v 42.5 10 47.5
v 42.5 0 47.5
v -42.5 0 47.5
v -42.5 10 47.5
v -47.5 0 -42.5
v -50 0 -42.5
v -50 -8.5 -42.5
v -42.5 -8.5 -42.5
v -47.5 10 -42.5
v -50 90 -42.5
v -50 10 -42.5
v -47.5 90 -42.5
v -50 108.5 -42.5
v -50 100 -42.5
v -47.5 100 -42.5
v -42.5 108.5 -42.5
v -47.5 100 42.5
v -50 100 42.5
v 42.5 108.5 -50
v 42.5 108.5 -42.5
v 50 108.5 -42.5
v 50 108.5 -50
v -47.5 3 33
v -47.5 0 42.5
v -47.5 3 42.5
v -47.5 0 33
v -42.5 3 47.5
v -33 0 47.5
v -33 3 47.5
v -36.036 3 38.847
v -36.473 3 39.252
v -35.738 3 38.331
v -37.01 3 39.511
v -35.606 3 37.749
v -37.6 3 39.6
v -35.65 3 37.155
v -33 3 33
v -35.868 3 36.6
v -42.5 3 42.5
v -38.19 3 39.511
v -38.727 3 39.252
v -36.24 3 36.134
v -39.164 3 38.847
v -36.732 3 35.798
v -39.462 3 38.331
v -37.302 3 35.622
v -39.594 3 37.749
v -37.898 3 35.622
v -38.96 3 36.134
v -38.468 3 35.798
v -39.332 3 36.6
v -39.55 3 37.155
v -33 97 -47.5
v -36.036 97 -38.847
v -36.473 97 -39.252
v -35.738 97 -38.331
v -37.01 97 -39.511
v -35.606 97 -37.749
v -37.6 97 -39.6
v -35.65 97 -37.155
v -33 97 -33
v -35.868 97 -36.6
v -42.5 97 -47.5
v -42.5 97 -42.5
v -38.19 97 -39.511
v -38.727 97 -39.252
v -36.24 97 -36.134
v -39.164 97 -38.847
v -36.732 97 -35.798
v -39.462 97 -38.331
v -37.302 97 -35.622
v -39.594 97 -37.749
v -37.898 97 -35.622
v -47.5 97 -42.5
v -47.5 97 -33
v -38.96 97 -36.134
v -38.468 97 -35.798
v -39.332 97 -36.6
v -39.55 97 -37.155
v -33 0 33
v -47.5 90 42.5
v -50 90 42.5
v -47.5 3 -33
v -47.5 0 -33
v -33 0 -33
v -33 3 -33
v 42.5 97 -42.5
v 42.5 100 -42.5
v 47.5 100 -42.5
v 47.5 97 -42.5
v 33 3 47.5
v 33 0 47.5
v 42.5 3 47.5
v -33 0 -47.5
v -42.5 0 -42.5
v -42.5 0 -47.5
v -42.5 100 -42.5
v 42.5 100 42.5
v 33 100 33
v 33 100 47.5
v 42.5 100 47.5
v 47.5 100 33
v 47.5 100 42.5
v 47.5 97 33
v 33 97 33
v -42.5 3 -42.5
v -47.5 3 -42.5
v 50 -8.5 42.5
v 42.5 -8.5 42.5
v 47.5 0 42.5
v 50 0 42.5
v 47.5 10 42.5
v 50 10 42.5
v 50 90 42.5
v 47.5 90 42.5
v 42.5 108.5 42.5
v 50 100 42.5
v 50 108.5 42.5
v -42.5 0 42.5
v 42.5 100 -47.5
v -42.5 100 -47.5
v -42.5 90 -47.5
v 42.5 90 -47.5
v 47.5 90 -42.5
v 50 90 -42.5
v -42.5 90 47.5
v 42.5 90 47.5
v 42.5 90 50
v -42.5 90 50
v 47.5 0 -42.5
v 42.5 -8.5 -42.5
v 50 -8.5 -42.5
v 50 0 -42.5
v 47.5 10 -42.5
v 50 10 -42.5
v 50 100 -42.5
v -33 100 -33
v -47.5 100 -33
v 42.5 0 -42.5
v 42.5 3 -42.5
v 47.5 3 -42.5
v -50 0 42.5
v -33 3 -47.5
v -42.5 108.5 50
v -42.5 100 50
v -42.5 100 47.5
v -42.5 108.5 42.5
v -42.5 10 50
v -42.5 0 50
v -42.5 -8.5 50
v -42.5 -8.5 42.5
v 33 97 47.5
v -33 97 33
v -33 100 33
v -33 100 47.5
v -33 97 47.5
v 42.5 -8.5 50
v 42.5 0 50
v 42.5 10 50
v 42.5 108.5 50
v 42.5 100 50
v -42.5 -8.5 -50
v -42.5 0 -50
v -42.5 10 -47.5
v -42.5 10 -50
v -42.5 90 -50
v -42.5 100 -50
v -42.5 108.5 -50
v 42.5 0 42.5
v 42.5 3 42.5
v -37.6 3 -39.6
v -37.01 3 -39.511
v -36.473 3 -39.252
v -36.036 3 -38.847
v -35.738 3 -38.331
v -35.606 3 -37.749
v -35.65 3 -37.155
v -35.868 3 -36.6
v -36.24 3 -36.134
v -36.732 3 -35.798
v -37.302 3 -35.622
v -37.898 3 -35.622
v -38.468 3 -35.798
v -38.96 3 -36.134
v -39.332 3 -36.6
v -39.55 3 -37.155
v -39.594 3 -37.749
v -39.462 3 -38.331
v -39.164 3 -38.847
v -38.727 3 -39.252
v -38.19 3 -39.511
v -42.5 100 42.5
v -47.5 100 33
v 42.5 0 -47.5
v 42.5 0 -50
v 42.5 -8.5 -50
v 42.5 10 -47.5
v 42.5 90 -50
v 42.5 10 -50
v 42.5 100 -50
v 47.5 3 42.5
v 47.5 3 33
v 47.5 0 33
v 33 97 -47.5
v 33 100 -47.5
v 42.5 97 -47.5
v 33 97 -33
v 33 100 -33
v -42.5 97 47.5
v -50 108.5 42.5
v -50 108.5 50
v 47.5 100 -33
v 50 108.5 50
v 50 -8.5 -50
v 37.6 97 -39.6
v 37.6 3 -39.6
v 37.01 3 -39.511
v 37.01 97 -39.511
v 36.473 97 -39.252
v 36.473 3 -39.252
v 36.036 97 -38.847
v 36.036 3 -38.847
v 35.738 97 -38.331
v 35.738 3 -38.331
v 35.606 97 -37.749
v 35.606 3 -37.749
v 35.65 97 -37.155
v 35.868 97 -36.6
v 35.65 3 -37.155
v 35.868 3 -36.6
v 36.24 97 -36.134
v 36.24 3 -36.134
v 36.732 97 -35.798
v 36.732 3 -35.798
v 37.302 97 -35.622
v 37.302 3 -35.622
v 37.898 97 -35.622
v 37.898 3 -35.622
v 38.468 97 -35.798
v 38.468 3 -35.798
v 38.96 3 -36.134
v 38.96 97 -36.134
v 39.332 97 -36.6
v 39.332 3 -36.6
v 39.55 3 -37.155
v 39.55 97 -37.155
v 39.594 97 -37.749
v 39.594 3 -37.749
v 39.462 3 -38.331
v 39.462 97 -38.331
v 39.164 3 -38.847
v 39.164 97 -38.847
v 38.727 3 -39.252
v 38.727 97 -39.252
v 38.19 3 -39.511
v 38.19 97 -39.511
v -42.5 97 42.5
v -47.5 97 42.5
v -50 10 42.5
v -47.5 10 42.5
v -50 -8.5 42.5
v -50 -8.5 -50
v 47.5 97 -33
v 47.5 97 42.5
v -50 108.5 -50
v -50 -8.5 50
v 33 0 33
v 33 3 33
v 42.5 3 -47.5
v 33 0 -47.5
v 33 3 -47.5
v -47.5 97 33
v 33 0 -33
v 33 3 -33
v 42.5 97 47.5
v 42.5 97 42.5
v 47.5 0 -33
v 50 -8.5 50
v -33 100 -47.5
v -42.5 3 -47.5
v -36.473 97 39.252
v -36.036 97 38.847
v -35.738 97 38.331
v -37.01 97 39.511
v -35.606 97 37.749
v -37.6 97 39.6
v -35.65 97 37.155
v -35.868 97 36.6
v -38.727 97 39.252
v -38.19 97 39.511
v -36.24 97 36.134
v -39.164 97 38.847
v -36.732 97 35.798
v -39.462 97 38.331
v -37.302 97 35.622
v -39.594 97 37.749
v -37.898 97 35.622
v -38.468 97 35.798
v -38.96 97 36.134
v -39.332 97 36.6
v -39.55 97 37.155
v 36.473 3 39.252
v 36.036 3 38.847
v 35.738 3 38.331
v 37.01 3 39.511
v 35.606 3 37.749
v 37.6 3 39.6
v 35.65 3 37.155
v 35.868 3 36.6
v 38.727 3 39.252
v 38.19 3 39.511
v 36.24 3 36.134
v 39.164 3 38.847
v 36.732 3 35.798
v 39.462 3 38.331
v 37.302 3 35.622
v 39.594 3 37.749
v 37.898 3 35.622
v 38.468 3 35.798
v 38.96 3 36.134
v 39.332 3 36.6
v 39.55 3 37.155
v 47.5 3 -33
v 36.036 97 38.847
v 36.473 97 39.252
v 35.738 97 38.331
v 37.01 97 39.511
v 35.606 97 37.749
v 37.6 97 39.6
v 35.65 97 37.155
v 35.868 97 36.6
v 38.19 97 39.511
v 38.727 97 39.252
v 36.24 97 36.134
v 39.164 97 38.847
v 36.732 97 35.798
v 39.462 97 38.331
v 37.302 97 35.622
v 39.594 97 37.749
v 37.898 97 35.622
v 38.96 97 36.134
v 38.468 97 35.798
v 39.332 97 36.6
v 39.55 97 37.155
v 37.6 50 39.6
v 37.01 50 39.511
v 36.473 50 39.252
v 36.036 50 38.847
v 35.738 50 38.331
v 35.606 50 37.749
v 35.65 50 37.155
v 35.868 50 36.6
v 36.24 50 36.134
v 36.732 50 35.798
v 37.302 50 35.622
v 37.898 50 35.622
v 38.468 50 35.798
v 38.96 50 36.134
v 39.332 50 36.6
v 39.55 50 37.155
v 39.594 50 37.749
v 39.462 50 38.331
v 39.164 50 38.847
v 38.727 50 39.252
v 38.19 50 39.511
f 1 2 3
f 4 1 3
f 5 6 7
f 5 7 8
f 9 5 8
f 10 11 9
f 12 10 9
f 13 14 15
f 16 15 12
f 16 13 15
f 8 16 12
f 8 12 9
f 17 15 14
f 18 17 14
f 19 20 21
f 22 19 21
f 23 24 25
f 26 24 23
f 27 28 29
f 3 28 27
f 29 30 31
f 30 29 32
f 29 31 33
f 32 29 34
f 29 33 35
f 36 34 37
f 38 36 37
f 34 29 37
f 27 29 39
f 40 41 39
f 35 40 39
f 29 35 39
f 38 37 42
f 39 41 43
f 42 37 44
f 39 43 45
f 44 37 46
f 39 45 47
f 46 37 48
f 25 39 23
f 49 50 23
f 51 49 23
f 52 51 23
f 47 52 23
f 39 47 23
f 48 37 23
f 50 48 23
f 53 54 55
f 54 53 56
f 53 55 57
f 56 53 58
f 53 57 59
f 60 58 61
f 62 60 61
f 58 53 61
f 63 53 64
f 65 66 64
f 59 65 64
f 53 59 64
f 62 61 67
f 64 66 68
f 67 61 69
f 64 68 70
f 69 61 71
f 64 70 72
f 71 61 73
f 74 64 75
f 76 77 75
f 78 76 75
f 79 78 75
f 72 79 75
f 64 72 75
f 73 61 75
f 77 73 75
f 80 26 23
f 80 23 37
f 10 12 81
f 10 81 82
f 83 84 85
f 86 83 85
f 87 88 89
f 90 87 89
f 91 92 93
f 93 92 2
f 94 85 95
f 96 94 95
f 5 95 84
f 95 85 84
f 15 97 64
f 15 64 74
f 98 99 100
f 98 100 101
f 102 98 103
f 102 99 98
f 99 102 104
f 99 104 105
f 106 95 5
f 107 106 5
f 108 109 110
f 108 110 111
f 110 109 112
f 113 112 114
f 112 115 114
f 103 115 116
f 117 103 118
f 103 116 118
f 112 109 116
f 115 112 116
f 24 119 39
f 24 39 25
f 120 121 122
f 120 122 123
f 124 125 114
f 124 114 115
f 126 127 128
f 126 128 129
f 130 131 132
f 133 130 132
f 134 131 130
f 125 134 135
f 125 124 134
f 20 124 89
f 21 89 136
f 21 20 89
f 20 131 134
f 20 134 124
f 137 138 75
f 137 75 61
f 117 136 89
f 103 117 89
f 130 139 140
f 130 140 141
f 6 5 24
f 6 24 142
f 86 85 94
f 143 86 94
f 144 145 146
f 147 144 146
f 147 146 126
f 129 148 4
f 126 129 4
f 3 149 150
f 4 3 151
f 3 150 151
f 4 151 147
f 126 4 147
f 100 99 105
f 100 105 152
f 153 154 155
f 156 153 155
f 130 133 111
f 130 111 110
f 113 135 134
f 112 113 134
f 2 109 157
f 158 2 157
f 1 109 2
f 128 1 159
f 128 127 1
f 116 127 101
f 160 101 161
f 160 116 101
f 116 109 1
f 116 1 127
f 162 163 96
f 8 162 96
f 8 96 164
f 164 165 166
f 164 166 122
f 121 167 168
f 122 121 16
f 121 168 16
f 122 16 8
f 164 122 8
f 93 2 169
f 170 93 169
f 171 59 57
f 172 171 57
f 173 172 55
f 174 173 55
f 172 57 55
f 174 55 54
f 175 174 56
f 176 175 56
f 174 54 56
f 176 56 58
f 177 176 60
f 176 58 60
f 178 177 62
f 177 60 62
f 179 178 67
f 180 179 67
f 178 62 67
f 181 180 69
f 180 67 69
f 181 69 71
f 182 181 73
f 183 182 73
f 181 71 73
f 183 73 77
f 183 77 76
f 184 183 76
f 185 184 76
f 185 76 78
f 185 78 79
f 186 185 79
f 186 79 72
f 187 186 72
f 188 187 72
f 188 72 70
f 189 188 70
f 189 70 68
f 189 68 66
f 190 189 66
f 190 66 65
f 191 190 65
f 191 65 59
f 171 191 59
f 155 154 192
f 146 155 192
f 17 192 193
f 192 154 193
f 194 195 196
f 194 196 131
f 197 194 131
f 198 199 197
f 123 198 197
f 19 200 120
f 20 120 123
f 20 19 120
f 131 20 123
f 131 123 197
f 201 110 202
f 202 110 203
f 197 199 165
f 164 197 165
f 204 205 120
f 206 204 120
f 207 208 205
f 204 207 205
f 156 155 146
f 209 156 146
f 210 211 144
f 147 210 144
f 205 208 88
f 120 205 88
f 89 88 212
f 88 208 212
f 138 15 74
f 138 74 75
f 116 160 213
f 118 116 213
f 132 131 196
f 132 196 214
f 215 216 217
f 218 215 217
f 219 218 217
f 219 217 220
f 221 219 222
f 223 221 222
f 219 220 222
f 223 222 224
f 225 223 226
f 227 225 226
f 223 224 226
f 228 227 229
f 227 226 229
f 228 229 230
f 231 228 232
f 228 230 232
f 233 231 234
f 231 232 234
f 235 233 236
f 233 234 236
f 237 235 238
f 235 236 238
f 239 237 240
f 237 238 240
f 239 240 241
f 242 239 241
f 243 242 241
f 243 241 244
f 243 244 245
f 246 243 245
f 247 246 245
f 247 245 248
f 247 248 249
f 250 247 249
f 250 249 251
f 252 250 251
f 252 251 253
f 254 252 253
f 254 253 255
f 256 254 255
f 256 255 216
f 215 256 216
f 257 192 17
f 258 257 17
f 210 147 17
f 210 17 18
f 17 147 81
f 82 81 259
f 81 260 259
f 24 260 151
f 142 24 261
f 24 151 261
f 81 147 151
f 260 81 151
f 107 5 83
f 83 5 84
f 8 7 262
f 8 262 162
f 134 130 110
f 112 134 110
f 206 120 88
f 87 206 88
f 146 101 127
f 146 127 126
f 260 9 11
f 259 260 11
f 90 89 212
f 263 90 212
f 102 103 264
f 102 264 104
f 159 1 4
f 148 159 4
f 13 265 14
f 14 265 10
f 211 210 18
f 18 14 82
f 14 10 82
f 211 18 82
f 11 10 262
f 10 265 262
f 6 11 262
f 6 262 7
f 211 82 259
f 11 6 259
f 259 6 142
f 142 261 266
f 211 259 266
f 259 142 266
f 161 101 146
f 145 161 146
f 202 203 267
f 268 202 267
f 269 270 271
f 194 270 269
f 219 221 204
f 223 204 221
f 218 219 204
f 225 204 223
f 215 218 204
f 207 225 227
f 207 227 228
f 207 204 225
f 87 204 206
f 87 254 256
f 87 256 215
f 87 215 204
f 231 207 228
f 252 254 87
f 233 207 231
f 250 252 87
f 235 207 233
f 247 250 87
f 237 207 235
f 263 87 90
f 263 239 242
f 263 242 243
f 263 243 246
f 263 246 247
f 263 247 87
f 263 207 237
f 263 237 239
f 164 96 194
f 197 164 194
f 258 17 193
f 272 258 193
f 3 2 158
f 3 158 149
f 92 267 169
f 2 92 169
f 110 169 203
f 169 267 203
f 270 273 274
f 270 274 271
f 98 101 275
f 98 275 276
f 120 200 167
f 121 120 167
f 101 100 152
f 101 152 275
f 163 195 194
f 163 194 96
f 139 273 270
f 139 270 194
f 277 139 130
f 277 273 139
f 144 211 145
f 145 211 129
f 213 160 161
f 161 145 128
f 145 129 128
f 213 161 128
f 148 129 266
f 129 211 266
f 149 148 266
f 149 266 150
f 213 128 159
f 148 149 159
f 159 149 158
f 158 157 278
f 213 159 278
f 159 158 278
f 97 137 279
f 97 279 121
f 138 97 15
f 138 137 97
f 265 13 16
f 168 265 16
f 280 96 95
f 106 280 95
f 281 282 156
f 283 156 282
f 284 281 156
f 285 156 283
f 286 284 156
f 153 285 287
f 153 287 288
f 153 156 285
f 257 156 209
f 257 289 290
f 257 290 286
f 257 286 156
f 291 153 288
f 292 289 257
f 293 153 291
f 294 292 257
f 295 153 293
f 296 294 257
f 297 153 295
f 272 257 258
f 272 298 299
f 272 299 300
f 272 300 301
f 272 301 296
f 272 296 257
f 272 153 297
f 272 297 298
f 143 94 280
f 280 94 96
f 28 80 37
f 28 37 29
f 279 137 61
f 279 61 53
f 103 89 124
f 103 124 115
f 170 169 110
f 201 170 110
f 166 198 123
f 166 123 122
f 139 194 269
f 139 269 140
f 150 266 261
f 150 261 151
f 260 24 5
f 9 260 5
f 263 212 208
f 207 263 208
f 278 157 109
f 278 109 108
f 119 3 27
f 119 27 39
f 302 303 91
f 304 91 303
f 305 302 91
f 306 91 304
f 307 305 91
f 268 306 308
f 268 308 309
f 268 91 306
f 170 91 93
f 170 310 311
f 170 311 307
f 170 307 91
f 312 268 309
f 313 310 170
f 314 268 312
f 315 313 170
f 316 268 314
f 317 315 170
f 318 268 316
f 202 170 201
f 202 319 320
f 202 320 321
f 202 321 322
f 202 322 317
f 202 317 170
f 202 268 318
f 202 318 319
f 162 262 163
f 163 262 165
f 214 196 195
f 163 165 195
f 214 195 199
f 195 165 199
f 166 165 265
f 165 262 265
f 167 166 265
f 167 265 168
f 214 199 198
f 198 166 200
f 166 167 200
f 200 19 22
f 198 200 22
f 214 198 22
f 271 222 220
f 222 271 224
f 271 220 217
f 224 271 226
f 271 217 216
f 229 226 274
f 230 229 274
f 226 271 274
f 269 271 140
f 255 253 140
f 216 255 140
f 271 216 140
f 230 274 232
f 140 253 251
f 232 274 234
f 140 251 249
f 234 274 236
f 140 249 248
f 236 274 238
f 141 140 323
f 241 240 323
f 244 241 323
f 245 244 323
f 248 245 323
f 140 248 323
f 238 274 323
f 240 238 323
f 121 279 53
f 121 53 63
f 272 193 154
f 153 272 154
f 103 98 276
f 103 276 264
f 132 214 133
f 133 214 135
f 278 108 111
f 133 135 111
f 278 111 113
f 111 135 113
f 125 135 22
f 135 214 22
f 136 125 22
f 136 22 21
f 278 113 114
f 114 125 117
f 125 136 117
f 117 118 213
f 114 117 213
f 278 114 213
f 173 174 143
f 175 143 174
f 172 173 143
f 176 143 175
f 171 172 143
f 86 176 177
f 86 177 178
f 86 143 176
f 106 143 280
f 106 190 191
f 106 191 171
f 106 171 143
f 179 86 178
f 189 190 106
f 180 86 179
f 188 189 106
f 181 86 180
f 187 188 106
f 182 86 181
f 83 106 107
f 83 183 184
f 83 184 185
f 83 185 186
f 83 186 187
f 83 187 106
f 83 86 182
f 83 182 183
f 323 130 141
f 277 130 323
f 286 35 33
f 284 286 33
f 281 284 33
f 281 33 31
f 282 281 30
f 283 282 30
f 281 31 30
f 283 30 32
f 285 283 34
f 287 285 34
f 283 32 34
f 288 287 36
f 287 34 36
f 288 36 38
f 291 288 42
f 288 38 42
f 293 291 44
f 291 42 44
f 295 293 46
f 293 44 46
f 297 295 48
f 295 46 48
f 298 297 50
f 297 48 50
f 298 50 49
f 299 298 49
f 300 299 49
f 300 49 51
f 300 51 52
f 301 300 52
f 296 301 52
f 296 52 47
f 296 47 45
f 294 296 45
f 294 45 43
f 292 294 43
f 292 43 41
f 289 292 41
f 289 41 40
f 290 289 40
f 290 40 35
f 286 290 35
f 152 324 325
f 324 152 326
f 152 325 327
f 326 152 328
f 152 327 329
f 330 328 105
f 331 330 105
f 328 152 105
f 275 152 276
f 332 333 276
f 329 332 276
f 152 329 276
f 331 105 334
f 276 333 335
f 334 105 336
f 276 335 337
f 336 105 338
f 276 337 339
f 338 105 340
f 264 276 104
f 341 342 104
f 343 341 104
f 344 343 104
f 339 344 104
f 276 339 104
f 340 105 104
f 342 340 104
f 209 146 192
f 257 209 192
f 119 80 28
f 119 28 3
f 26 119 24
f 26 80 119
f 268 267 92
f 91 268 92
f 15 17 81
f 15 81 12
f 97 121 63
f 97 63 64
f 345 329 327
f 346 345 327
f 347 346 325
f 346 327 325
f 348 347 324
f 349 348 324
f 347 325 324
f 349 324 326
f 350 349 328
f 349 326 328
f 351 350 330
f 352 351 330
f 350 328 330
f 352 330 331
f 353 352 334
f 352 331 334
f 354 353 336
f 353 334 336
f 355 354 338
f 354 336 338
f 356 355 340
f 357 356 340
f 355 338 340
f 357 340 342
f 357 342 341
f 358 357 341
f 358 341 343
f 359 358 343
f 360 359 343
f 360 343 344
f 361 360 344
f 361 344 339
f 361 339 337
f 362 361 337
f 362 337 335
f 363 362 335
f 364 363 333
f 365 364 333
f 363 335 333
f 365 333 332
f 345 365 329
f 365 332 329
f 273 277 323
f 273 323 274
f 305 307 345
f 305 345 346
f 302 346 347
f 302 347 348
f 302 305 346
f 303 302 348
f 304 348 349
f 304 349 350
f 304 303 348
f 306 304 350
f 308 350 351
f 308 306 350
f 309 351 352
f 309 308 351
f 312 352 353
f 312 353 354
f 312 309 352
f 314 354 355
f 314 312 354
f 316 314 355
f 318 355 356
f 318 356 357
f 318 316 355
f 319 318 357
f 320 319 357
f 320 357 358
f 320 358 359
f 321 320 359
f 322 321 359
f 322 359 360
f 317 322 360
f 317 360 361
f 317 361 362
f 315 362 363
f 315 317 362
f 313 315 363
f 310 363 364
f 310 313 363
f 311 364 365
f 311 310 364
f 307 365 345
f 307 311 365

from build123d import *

# Parameters (mm, degrees)
BOSS_EXTRUDE1_DEPTH  = 10
SKETCH3_W            = 7.5
SKETCH3_H            = 7.5
BOSS_EXTRUDE2_DEPTH  = 40
SKETCH5_W            = 7.5
SKETCH5_H            = 7.5
BOSS_EXTRUDE8_DEPTH  = 8.5
BOSS_EXTRUDE9_DEPTH  = 3
SKETCH7_R            = 2
BOSS_EXTRUDE10_DEPTH = 47


with BuildPart() as part:
    # Sketch2 → Boss-Extrude1 (new body)
    with BuildSketch(Plane(origin=(0, 0, 0), x_dir=(1, 0, 0), z_dir=(0, 1, 0))):
        Polygon((-50, 50), (-42.5, 50), (0, 50), (42.5, 50), (50, 50), (50, 42.5), (50, 0), (50, -42.5), (50, -50), (42.5, -50), (0, -50), (-42.5, -50), (-50, -50), (-50, -42.5), (-50, 0), (-50, 42.5), align=None)
        Polygon((-42.5, 42.5), (-42.5, 47.5), (0, 47.5), (42.5, 47.5), (42.5, 42.5), (47.5, 42.5), (47.5, 0), (47.5, -42.5), (42.5, -42.5), (42.5, -47.5), (0, -47.5), (-42.5, -47.5), (-42.5, -42.5), (-47.5, -42.5), (-47.5, 0), (-47.5, 42.5), align=None, mode=Mode.SUBTRACT)
    extrude(amount=BOSS_EXTRUDE1_DEPTH)

    # Sketch3 → Boss-Extrude2 (add)
    with BuildSketch(Plane(origin=(0, 10, 0), x_dir=(1, 0, 0), z_dir=(0, 1, 0))):
        with Locations((46.25, 46.25)):
            Rectangle(SKETCH3_W, SKETCH3_H)
        with Locations((46.25, -46.25)):
            Rectangle(SKETCH3_W, SKETCH3_H)
        with Locations((-46.25, 46.25)):
            Rectangle(SKETCH3_W, SKETCH3_H)
        with Locations((-46.25, -46.25)):
            Rectangle(SKETCH3_W, SKETCH3_H)
    extrude(amount=BOSS_EXTRUDE2_DEPTH)

    # Sketch5 → Boss-Extrude8 (add)
    with BuildSketch(Plane.XZ):
        with Locations((46.25, -46.25)):
            Rectangle(SKETCH5_W, SKETCH5_H)
        with Locations((46.25, 46.25)):
            Rectangle(SKETCH5_W, SKETCH5_H)
        with Locations((-46.25, 46.25)):
            Rectangle(SKETCH5_W, SKETCH5_H)
        with Locations((-46.25, -46.25)):
            Rectangle(SKETCH5_W, SKETCH5_H)
    extrude(amount=BOSS_EXTRUDE8_DEPTH)


with BuildPart() as body_2:
    # Sketch6 → Boss-Extrude9 (new body)
    with BuildSketch(Plane.XZ):
        Polygon((42.5, -42.5), (47.5, -42.5), (47.5, -33), (33, -33), (33, -47.5), (42.5, -47.5), align=None)
    extrude(amount=-BOSS_EXTRUDE9_DEPTH)


with BuildPart() as body_3:
    # Sketch7 → Boss-Extrude10 (new body)
    with BuildSketch(Plane(origin=(0, 3, 0), x_dir=(1, 0, 0), z_dir=(0, 1, 0))):
        with Locations(Location((37.6, 37.6, 0), (0, 0, 90))):
            Circle(SKETCH7_R)
    extrude(amount=BOSS_EXTRUDE10_DEPTH)


with BuildPart() as body_4:
    # Mirror2: mirrored copy
    add(body_3.part.mirror(Plane(origin=(0, 0, 0), x_dir=(0, 0, 1), z_dir=(1, 0, 0))))


with BuildPart() as body_5:
    # Mirror2 2: mirrored copy
    add(body_2.part.mirror(Plane(origin=(0, 0, 0), x_dir=(0, 0, 1), z_dir=(1, 0, 0))))


with BuildPart() as body_6:
    # Mirror3: mirrored copy
    add(body_5.part.mirror(Plane.XY))


with BuildPart() as body_7:
    # Mirror3 2: mirrored copy
    add(body_4.part.mirror(Plane.XY))


with BuildPart() as body_8:
    # Mirror3 3: mirrored copy
    add(body_3.part.mirror(Plane.XY))


with BuildPart() as body_9:
    # Mirror3 4: mirrored copy
    add(body_2.part.mirror(Plane.XY))


with BuildPart() as body_10:
    # Mirror4: mirrored copy
    add(part.part.mirror(Plane(origin=(0, 50, 0), x_dir=(0, 0, 1), z_dir=(0, -1, 0))))

    # Combine1: union part
    add(part.part)


with BuildPart() as body_11:
    # Mirror4 2: mirrored copy
    add(body_7.part.mirror(Plane(origin=(0, 50, 0), x_dir=(0, 0, 1), z_dir=(0, -1, 0))))


with BuildPart() as body_12:
    # Mirror4 3: mirrored copy
    add(body_6.part.mirror(Plane(origin=(0, 50, 0), x_dir=(0, 0, 1), z_dir=(0, -1, 0))))


with BuildPart() as body_13:
    # Mirror4 4: mirrored copy
    add(body_5.part.mirror(Plane(origin=(0, 50, 0), x_dir=(0, 0, 1), z_dir=(0, -1, 0))))


with BuildPart() as body_14:
    # Mirror4 5: mirrored copy
    add(body_4.part.mirror(Plane(origin=(0, 50, 0), x_dir=(0, 0, 1), z_dir=(0, -1, 0))))


with BuildPart() as body_15:
    # Mirror4 6: mirrored copy
    add(body_3.part.mirror(Plane(origin=(0, 50, 0), x_dir=(0, 0, 1), z_dir=(0, -1, 0))))


with BuildPart() as body_16:
    # Mirror4 7: mirrored copy
    add(body_2.part.mirror(Plane(origin=(0, 50, 0), x_dir=(0, 0, 1), z_dir=(0, -1, 0))))


with BuildPart() as body_17:
    # Mirror4 8: mirrored copy
    add(body_9.part.mirror(Plane(origin=(0, 50, 0), x_dir=(0, 0, 1), z_dir=(0, -1, 0))))


with BuildPart() as body_18:
    # Mirror4 9: mirrored copy
    add(body_8.part.mirror(Plane(origin=(0, 50, 0), x_dir=(0, 0, 1), z_dir=(0, -1, 0))))

    # Combine5: union body 8
    add(body_8.part)


with BuildPart() as body_7_1:
    add(body_7.part)

    # Combine2: union body 11
    add(body_11.part)


with BuildPart() as body_4_1:
    add(body_4.part)

    # Combine3: union body 14
    add(body_14.part)


with BuildPart() as body_3_1:
    add(body_3.part)

    # Combine4: union body 15
    add(body_15.part)


with BuildPart() as body_2_1:
    add(body_2.part)

    # Combine6: union body 3, body 16
    add(body_3_1.part)
    add(body_16.part)


with BuildPart() as body_5_1:
    add(body_5.part)

    # Combine7: union body 4, body 13
    add(body_4_1.part)
    add(body_13.part)


with BuildPart() as body_6_1:
    add(body_6.part)

    # Combine8: union body 7, body 12
    add(body_7_1.part)
    add(body_12.part)


with BuildPart() as body_17_1:
    add(body_17.part)

    # Combine9: union body 9, body 18
    add(body_9.part)
    add(body_18.part)


solid = Compound([body_10.part, body_2_1.part, body_5_1.part, body_6_1.part, body_17_1.part])
